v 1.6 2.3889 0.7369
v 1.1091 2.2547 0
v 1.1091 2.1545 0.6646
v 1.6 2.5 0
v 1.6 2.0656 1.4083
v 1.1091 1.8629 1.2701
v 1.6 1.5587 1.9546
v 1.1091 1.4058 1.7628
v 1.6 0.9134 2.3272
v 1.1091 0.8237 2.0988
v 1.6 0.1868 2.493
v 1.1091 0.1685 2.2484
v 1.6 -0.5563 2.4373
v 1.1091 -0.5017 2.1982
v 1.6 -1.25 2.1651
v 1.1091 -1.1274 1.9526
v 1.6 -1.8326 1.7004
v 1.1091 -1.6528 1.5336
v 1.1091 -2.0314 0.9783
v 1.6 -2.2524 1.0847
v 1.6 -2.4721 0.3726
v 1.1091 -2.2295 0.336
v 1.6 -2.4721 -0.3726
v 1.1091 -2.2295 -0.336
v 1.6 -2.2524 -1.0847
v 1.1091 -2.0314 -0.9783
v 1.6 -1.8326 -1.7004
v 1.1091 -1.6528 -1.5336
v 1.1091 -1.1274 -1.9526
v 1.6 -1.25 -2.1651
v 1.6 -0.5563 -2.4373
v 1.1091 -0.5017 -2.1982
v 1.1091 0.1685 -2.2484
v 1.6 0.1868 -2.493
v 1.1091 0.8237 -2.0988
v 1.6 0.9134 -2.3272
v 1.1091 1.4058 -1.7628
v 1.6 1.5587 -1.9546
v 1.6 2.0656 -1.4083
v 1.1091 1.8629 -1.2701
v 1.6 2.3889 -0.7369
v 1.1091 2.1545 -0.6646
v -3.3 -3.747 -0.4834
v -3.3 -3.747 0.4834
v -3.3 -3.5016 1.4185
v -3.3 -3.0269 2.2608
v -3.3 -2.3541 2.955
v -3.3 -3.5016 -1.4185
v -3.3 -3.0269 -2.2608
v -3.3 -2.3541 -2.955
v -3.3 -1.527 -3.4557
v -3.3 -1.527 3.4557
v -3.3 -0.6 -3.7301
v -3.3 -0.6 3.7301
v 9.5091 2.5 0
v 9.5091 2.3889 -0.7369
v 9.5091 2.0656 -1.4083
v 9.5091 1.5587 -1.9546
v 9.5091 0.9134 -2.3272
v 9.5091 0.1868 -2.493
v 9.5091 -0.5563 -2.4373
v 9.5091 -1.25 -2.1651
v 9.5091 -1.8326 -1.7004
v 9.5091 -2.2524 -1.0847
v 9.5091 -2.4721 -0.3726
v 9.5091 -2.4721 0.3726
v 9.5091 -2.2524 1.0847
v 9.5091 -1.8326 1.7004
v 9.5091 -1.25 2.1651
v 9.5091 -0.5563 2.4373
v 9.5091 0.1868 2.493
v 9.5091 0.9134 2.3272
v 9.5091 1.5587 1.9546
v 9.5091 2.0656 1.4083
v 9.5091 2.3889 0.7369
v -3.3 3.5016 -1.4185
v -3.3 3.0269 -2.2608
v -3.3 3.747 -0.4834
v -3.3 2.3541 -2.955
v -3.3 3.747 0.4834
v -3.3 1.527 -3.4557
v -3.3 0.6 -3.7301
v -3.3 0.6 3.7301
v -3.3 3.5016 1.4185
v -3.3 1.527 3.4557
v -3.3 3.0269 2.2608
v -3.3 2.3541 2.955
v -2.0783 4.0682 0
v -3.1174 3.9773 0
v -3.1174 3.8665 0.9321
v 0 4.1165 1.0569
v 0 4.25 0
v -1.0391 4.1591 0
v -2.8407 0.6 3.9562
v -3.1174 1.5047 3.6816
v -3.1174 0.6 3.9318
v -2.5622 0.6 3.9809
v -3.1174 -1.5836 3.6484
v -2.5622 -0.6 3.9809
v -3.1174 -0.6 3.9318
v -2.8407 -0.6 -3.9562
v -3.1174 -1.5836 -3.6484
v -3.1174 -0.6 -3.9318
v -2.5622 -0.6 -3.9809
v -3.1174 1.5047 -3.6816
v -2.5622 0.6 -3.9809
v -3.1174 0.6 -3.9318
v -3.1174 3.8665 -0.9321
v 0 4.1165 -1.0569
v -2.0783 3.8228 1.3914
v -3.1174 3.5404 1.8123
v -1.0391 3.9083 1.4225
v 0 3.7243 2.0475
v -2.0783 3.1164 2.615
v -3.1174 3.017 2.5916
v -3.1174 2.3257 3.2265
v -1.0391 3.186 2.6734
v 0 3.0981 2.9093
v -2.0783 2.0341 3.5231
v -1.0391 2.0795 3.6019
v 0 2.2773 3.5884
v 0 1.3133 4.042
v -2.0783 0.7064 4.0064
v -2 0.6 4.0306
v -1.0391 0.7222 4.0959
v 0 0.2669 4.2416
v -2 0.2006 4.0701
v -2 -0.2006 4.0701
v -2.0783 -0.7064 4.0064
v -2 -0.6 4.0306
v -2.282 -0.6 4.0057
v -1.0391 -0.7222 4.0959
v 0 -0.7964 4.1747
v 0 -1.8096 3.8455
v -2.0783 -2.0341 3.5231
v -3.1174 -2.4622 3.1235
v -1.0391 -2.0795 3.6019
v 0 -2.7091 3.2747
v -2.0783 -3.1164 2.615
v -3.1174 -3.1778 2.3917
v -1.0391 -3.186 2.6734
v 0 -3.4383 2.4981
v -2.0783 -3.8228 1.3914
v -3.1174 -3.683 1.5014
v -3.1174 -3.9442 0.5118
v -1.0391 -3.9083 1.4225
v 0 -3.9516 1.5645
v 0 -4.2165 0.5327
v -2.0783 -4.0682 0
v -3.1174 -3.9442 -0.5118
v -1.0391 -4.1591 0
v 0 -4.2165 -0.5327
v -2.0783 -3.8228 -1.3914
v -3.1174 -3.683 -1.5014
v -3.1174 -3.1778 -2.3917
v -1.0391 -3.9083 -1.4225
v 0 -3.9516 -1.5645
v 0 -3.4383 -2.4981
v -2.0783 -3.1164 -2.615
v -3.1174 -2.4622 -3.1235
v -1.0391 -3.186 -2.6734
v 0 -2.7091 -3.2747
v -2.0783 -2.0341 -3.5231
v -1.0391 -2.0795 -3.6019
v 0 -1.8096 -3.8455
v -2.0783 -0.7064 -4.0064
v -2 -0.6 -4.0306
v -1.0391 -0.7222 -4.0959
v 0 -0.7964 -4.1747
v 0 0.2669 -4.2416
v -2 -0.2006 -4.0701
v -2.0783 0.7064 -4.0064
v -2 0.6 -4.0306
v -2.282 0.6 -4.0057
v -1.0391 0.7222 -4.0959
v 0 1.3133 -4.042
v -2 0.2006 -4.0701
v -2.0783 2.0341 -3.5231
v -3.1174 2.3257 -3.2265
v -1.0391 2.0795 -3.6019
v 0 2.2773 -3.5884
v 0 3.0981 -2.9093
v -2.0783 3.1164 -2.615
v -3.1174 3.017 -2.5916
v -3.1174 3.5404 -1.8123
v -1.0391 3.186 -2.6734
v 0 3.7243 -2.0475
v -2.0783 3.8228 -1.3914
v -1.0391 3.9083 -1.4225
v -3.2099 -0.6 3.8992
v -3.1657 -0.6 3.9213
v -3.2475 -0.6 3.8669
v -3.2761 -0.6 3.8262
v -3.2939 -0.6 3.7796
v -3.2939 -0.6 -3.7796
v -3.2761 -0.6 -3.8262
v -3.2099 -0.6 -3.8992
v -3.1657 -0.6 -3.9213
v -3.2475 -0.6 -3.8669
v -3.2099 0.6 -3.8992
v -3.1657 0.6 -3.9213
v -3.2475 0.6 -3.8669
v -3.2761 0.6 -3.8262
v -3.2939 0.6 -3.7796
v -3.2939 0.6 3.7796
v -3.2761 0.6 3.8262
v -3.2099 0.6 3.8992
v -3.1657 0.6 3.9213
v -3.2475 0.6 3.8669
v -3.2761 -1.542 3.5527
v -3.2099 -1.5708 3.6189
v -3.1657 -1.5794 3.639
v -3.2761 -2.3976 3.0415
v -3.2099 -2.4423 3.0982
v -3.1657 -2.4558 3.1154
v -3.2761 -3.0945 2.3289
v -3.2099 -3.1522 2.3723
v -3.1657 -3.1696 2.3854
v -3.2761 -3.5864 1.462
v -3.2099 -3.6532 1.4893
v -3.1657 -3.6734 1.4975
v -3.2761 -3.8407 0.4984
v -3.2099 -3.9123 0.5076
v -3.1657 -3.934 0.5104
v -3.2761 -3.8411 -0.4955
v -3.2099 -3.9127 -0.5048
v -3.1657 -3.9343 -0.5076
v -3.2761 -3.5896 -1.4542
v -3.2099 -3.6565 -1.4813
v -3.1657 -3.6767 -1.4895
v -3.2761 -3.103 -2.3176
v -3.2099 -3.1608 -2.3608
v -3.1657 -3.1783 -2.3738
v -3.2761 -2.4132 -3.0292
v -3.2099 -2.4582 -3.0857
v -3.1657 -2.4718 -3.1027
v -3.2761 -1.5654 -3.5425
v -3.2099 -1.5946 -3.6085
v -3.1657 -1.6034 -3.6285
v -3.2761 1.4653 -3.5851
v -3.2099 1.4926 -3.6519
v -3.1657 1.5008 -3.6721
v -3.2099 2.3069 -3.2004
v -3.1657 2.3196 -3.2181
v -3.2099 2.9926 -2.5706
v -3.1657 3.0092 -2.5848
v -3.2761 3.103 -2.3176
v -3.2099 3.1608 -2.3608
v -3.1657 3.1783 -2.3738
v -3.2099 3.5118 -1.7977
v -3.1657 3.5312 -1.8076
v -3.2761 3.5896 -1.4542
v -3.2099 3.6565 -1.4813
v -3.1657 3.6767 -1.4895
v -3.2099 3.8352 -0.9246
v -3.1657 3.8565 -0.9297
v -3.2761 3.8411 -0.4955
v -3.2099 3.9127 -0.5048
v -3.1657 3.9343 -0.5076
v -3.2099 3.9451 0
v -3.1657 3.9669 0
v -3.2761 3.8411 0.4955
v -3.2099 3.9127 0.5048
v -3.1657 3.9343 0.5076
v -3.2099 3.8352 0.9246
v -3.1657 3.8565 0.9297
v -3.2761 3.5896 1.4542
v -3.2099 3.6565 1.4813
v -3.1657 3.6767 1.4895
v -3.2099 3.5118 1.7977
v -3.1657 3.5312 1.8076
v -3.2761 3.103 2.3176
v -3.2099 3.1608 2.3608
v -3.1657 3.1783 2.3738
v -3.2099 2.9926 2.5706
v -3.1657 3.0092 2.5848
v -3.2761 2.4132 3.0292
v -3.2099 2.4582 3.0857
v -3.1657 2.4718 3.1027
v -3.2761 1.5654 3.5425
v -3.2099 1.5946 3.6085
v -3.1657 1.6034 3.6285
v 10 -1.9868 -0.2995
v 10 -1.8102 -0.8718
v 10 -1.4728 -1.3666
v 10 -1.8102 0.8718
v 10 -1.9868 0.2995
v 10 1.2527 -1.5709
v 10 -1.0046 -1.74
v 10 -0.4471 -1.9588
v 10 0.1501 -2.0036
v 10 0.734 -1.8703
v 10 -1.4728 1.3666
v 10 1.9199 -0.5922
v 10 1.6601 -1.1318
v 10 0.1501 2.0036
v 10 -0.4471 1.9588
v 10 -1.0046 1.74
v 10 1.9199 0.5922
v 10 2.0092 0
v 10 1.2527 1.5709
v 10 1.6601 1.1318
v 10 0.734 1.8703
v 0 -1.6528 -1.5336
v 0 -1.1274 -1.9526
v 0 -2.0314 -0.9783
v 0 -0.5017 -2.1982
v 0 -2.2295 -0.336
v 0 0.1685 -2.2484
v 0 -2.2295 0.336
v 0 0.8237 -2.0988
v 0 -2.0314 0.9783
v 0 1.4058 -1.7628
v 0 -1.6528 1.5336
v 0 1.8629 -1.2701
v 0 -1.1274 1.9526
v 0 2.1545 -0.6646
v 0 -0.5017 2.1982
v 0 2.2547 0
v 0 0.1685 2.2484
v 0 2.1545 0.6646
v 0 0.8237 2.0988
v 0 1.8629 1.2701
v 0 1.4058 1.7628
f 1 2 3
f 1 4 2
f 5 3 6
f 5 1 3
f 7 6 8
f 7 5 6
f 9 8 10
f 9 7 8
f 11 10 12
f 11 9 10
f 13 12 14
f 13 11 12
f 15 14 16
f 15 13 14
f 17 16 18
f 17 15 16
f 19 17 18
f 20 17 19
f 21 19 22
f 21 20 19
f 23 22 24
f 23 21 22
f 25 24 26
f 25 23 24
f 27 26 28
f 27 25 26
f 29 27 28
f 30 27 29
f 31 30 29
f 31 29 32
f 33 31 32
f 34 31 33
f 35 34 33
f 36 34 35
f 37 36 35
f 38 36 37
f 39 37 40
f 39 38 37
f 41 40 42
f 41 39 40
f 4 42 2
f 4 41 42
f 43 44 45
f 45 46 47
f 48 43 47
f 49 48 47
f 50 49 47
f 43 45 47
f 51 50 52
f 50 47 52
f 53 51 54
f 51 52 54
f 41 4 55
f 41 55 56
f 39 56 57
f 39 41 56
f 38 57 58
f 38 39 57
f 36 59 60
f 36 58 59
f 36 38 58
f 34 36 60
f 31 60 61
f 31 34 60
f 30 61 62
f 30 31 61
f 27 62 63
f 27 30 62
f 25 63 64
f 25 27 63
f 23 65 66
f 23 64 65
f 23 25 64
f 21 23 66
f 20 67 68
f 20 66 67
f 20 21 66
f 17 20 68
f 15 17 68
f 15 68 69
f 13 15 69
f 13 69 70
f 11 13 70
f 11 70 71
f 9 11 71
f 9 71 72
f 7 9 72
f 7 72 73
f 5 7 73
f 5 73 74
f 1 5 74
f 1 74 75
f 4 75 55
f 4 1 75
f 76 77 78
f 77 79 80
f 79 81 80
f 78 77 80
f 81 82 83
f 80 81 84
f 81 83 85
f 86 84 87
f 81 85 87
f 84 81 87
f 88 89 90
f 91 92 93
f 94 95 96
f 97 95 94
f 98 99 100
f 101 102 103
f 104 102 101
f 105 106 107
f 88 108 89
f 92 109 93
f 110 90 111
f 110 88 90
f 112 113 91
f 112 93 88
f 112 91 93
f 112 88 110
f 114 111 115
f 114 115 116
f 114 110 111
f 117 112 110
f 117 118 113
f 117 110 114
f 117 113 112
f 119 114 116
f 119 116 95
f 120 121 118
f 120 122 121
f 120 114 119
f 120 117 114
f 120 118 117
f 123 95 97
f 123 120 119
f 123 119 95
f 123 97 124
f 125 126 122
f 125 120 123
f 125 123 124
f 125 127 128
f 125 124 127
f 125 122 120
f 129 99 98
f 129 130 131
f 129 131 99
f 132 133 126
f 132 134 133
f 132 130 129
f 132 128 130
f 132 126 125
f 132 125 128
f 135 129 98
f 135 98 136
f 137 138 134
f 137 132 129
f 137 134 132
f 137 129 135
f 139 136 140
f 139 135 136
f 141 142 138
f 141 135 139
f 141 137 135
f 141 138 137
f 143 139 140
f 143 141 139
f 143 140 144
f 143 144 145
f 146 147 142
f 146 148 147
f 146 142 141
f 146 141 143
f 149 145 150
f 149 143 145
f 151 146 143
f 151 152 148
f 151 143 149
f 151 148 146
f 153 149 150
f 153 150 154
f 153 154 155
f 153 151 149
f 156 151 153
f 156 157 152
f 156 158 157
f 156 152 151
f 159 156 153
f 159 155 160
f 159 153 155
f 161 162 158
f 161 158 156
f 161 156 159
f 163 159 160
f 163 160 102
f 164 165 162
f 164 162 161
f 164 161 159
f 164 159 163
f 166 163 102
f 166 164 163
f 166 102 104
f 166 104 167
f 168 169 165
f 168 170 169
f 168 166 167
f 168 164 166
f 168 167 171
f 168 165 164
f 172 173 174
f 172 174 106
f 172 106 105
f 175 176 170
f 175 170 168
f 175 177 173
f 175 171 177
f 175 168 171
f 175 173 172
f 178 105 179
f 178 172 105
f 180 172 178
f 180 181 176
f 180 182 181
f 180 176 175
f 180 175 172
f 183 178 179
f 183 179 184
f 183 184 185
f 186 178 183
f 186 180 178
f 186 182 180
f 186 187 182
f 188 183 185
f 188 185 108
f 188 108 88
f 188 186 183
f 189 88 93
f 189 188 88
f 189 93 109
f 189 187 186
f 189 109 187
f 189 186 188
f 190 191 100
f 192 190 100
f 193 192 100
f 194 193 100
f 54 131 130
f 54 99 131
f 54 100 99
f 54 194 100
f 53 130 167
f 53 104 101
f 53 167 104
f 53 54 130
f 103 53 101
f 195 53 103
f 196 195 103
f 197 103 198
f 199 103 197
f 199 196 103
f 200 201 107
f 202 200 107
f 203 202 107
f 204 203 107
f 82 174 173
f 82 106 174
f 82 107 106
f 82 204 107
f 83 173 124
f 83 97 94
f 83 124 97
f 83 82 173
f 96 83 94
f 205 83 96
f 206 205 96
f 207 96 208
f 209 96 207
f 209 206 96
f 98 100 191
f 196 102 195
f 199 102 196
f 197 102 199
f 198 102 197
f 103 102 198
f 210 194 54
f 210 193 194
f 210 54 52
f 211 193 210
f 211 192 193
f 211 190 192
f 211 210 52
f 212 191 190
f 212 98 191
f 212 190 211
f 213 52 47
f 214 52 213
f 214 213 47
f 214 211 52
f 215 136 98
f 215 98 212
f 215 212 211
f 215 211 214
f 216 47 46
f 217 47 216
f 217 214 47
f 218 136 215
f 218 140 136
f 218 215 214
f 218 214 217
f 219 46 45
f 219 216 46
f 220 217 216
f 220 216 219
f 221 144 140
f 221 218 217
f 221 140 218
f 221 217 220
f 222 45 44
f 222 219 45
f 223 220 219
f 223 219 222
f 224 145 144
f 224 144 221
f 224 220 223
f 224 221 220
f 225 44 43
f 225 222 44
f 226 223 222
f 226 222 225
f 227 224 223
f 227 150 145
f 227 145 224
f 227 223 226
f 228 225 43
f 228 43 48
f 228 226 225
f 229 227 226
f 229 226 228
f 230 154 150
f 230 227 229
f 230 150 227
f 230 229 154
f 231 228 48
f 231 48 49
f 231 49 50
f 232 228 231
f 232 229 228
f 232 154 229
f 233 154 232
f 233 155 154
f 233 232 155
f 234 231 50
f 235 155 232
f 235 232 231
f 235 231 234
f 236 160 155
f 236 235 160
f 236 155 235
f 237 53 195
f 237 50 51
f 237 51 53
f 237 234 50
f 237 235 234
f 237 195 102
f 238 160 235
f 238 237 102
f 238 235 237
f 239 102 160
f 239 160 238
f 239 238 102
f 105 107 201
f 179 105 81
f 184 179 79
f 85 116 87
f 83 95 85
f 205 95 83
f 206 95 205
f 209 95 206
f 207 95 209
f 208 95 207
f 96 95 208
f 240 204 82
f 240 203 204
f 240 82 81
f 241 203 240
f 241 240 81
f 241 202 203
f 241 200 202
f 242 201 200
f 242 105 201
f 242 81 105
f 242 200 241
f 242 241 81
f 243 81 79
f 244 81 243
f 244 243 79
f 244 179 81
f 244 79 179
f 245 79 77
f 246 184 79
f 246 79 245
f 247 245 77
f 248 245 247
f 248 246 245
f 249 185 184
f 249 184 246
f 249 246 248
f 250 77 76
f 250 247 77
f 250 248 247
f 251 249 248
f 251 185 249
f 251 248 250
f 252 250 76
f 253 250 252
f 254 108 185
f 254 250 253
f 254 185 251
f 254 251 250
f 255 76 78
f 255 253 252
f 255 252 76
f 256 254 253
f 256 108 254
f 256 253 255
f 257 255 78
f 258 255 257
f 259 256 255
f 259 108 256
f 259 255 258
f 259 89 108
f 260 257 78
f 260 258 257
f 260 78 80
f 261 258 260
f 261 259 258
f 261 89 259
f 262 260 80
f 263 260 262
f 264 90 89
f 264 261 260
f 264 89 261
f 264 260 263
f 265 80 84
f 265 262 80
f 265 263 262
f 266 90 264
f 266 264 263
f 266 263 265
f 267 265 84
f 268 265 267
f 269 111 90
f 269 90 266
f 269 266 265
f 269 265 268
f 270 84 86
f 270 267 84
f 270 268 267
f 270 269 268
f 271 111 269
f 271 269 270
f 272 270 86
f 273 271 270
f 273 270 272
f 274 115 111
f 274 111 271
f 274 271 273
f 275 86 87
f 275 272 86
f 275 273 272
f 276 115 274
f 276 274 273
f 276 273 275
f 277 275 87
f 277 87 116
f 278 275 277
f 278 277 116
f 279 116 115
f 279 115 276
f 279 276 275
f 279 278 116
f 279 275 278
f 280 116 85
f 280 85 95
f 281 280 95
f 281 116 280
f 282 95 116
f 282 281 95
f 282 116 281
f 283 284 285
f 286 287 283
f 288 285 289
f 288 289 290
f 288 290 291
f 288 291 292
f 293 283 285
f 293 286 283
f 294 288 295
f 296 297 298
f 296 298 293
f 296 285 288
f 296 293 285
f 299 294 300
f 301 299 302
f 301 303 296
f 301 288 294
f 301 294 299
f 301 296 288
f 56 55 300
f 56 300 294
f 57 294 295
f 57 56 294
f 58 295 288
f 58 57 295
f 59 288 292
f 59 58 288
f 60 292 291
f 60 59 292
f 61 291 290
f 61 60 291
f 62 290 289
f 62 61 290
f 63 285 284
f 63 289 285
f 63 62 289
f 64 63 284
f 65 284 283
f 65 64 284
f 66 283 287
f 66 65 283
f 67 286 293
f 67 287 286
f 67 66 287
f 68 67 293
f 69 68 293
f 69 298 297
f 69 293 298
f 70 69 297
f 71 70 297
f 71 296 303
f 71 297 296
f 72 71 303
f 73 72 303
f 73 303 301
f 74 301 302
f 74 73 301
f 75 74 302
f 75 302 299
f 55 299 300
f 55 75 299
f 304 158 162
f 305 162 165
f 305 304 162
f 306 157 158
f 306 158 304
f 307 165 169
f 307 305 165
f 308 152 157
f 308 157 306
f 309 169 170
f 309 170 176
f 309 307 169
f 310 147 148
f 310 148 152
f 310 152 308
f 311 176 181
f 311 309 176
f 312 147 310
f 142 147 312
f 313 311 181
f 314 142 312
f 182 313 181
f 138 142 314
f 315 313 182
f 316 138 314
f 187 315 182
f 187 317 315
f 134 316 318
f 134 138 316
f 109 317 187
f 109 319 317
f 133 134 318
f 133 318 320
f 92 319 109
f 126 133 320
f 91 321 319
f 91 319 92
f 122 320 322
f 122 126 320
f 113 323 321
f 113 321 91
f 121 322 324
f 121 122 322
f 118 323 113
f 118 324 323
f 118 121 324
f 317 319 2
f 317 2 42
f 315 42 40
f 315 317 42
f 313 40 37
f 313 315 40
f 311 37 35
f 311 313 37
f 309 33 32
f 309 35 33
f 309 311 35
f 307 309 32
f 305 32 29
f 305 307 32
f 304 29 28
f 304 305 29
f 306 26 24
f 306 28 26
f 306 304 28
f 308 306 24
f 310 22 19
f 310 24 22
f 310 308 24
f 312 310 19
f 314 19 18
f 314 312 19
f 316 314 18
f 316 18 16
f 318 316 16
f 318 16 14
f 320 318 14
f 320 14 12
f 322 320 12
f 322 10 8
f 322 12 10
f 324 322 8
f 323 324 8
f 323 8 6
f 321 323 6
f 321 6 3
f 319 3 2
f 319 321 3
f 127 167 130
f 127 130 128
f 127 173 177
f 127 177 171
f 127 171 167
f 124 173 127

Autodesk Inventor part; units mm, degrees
ref_plane "YZ Plane" through (0, 0, 0) normal (1, 0, 0) x (0, 1, 0)
ref_plane "XZ Plane" through (0, 0, 0) normal (0, 1, 0) x (-1, 0, 0)
sketch "Sketch1" plane through (0, 0, 0) normal (0, 0, 1) x (1, 0, 0)
  line L0 (-3.3, 0) -> (10, 0)
  line L1 (10, 0) -> (10, 2.5)
  line L2 (10, 2.5) -> (1.6, 2.5)
  line L3 (1.6, 2.5) -> (1.1091, 2.2547)
  line L4 (1.1091, 2.2547) -> (0, 2.2547)
  line L5 (0, 2.2547) -> (0, 4.25)
  line L6 (-5.96, 0) -> (12.66, 0) projected
  line L7 (0, -0.85) -> (0, 5.1) projected
  line L8 (-3.3, 0) -> (-3.3, 3.9613)
  line L9 (0, 4.25) -> (-3.3, 3.9613)
  line L10 (1.6, 2.5) -> (0, 2.5) construction
  dimension "d0" = 10
  dimension "d1" = 8.4
  dimension "d2" = 0.4909
  dimension "d3" = 3.3
  dimension "d4" = 5
  dimension "d5" = 4.5095
  dimension "d9" = 8.5
  dimension "d10" = 5
revolve "Body" add sketch "Sketch1" angle 360 about axis through (-3.3, 0, 0) along (1, 0, 0)
sketch "Sketch2" plane through (-3.3, 0, 0) normal (-1, 0, 0) x (0, 0, 1)
  circle A0 centre (0, 0) radius 4.25 projected
  line L0 (0, 0) -> (0, 3.9613) projected
  line L1 (-4.25, 0.6) -> (4.25, 0.6)
  line L2 (4.25, 0.6) -> (4.25, -0.6)
  line L3 (4.25, -0.6) -> (-4.25, -0.6)
  line L4 (-4.25, -0.6) -> (-4.25, 0.6)
  line L5 (-4.25, 0) -> (4.25, 0) construction
  line L6 (0, 0.6) -> (0, -0.6) construction
  point P0 (0, 0)
  dimension "d11" = 1.2
  dimension "d12" = 8.5
fillet "Fillet1" radius 0.2 1 edges at (-3.3, -3.9613, 0)
extrude "Slot" cut sketch "Sketch2" against normal blind 1.3 contours A0 L3 L1 | L2 L3 A0 | A0 L1 L2 | A0 L4 L1 | L3 L4 A0
thread "Thread" size "M5x0.8" class "6g" standard "ISO Metric profile" length 8.4
chamfer "Chamfer1" distance 0.4908 distance2 0.4909 1 edges at (10, -2.5, 0) measured on face at (10, 0.6684, -0.7339)
ref_plane "Work Plane1" through (30.1625, 0, 0) normal (0, 0, -1) x (1, 0, 0)
equation "\"d11\" = SBR"
equation "\"d12\" = KOD"
equation "\"d19\" = STI"
equation "\"d14\" = RR"
equation "\"d15\" = GEL"
equation "\"d17\" = -0.5 * SPD + 0.5 * GD"
equation "\"d0\" = NLG"
equation "\"d1\" = GEL"
equation "\"d3\" = KOH"
equation "\"d4\" = GD"
equation "\"d5\" = BDM"
equation "\"d9\" = KOD"
equation "\"d10\" = KEWI"
equation "\"GD\" = NND"
equation "\"NLG\" = 10"
equation "\"GEL\" = 8.4"
equation "\"KOD\" = 8.5"
equation "\"KOH\" = 3.3"
equation "\"GAL\" = 0.61345 * PTC"
equation "\"SPD\" = NND - 1.2269 * PTC"
equation "\"BDM\" = 4.5095"
equation "\"GUL\" = 0.61345 * PTC"
equation "\"RR\" = 0.2"
equation "\"SBR\" = 1.2"
equation "\"STI\" = 1.3"
equation "\"KEWI\" = 5deg"
equation "\"PTC\" = 0.8"
equation "\"THREADDIA\" = 5"
equation "\"TOA\" = 30deg"
equation "\"NND\" = 5"
equation "\"GD1\" = THREADDIA - 1.2269 * PTC"
properties part number "ISO 1207 - M5 x 10" material "X105CrMo17"
